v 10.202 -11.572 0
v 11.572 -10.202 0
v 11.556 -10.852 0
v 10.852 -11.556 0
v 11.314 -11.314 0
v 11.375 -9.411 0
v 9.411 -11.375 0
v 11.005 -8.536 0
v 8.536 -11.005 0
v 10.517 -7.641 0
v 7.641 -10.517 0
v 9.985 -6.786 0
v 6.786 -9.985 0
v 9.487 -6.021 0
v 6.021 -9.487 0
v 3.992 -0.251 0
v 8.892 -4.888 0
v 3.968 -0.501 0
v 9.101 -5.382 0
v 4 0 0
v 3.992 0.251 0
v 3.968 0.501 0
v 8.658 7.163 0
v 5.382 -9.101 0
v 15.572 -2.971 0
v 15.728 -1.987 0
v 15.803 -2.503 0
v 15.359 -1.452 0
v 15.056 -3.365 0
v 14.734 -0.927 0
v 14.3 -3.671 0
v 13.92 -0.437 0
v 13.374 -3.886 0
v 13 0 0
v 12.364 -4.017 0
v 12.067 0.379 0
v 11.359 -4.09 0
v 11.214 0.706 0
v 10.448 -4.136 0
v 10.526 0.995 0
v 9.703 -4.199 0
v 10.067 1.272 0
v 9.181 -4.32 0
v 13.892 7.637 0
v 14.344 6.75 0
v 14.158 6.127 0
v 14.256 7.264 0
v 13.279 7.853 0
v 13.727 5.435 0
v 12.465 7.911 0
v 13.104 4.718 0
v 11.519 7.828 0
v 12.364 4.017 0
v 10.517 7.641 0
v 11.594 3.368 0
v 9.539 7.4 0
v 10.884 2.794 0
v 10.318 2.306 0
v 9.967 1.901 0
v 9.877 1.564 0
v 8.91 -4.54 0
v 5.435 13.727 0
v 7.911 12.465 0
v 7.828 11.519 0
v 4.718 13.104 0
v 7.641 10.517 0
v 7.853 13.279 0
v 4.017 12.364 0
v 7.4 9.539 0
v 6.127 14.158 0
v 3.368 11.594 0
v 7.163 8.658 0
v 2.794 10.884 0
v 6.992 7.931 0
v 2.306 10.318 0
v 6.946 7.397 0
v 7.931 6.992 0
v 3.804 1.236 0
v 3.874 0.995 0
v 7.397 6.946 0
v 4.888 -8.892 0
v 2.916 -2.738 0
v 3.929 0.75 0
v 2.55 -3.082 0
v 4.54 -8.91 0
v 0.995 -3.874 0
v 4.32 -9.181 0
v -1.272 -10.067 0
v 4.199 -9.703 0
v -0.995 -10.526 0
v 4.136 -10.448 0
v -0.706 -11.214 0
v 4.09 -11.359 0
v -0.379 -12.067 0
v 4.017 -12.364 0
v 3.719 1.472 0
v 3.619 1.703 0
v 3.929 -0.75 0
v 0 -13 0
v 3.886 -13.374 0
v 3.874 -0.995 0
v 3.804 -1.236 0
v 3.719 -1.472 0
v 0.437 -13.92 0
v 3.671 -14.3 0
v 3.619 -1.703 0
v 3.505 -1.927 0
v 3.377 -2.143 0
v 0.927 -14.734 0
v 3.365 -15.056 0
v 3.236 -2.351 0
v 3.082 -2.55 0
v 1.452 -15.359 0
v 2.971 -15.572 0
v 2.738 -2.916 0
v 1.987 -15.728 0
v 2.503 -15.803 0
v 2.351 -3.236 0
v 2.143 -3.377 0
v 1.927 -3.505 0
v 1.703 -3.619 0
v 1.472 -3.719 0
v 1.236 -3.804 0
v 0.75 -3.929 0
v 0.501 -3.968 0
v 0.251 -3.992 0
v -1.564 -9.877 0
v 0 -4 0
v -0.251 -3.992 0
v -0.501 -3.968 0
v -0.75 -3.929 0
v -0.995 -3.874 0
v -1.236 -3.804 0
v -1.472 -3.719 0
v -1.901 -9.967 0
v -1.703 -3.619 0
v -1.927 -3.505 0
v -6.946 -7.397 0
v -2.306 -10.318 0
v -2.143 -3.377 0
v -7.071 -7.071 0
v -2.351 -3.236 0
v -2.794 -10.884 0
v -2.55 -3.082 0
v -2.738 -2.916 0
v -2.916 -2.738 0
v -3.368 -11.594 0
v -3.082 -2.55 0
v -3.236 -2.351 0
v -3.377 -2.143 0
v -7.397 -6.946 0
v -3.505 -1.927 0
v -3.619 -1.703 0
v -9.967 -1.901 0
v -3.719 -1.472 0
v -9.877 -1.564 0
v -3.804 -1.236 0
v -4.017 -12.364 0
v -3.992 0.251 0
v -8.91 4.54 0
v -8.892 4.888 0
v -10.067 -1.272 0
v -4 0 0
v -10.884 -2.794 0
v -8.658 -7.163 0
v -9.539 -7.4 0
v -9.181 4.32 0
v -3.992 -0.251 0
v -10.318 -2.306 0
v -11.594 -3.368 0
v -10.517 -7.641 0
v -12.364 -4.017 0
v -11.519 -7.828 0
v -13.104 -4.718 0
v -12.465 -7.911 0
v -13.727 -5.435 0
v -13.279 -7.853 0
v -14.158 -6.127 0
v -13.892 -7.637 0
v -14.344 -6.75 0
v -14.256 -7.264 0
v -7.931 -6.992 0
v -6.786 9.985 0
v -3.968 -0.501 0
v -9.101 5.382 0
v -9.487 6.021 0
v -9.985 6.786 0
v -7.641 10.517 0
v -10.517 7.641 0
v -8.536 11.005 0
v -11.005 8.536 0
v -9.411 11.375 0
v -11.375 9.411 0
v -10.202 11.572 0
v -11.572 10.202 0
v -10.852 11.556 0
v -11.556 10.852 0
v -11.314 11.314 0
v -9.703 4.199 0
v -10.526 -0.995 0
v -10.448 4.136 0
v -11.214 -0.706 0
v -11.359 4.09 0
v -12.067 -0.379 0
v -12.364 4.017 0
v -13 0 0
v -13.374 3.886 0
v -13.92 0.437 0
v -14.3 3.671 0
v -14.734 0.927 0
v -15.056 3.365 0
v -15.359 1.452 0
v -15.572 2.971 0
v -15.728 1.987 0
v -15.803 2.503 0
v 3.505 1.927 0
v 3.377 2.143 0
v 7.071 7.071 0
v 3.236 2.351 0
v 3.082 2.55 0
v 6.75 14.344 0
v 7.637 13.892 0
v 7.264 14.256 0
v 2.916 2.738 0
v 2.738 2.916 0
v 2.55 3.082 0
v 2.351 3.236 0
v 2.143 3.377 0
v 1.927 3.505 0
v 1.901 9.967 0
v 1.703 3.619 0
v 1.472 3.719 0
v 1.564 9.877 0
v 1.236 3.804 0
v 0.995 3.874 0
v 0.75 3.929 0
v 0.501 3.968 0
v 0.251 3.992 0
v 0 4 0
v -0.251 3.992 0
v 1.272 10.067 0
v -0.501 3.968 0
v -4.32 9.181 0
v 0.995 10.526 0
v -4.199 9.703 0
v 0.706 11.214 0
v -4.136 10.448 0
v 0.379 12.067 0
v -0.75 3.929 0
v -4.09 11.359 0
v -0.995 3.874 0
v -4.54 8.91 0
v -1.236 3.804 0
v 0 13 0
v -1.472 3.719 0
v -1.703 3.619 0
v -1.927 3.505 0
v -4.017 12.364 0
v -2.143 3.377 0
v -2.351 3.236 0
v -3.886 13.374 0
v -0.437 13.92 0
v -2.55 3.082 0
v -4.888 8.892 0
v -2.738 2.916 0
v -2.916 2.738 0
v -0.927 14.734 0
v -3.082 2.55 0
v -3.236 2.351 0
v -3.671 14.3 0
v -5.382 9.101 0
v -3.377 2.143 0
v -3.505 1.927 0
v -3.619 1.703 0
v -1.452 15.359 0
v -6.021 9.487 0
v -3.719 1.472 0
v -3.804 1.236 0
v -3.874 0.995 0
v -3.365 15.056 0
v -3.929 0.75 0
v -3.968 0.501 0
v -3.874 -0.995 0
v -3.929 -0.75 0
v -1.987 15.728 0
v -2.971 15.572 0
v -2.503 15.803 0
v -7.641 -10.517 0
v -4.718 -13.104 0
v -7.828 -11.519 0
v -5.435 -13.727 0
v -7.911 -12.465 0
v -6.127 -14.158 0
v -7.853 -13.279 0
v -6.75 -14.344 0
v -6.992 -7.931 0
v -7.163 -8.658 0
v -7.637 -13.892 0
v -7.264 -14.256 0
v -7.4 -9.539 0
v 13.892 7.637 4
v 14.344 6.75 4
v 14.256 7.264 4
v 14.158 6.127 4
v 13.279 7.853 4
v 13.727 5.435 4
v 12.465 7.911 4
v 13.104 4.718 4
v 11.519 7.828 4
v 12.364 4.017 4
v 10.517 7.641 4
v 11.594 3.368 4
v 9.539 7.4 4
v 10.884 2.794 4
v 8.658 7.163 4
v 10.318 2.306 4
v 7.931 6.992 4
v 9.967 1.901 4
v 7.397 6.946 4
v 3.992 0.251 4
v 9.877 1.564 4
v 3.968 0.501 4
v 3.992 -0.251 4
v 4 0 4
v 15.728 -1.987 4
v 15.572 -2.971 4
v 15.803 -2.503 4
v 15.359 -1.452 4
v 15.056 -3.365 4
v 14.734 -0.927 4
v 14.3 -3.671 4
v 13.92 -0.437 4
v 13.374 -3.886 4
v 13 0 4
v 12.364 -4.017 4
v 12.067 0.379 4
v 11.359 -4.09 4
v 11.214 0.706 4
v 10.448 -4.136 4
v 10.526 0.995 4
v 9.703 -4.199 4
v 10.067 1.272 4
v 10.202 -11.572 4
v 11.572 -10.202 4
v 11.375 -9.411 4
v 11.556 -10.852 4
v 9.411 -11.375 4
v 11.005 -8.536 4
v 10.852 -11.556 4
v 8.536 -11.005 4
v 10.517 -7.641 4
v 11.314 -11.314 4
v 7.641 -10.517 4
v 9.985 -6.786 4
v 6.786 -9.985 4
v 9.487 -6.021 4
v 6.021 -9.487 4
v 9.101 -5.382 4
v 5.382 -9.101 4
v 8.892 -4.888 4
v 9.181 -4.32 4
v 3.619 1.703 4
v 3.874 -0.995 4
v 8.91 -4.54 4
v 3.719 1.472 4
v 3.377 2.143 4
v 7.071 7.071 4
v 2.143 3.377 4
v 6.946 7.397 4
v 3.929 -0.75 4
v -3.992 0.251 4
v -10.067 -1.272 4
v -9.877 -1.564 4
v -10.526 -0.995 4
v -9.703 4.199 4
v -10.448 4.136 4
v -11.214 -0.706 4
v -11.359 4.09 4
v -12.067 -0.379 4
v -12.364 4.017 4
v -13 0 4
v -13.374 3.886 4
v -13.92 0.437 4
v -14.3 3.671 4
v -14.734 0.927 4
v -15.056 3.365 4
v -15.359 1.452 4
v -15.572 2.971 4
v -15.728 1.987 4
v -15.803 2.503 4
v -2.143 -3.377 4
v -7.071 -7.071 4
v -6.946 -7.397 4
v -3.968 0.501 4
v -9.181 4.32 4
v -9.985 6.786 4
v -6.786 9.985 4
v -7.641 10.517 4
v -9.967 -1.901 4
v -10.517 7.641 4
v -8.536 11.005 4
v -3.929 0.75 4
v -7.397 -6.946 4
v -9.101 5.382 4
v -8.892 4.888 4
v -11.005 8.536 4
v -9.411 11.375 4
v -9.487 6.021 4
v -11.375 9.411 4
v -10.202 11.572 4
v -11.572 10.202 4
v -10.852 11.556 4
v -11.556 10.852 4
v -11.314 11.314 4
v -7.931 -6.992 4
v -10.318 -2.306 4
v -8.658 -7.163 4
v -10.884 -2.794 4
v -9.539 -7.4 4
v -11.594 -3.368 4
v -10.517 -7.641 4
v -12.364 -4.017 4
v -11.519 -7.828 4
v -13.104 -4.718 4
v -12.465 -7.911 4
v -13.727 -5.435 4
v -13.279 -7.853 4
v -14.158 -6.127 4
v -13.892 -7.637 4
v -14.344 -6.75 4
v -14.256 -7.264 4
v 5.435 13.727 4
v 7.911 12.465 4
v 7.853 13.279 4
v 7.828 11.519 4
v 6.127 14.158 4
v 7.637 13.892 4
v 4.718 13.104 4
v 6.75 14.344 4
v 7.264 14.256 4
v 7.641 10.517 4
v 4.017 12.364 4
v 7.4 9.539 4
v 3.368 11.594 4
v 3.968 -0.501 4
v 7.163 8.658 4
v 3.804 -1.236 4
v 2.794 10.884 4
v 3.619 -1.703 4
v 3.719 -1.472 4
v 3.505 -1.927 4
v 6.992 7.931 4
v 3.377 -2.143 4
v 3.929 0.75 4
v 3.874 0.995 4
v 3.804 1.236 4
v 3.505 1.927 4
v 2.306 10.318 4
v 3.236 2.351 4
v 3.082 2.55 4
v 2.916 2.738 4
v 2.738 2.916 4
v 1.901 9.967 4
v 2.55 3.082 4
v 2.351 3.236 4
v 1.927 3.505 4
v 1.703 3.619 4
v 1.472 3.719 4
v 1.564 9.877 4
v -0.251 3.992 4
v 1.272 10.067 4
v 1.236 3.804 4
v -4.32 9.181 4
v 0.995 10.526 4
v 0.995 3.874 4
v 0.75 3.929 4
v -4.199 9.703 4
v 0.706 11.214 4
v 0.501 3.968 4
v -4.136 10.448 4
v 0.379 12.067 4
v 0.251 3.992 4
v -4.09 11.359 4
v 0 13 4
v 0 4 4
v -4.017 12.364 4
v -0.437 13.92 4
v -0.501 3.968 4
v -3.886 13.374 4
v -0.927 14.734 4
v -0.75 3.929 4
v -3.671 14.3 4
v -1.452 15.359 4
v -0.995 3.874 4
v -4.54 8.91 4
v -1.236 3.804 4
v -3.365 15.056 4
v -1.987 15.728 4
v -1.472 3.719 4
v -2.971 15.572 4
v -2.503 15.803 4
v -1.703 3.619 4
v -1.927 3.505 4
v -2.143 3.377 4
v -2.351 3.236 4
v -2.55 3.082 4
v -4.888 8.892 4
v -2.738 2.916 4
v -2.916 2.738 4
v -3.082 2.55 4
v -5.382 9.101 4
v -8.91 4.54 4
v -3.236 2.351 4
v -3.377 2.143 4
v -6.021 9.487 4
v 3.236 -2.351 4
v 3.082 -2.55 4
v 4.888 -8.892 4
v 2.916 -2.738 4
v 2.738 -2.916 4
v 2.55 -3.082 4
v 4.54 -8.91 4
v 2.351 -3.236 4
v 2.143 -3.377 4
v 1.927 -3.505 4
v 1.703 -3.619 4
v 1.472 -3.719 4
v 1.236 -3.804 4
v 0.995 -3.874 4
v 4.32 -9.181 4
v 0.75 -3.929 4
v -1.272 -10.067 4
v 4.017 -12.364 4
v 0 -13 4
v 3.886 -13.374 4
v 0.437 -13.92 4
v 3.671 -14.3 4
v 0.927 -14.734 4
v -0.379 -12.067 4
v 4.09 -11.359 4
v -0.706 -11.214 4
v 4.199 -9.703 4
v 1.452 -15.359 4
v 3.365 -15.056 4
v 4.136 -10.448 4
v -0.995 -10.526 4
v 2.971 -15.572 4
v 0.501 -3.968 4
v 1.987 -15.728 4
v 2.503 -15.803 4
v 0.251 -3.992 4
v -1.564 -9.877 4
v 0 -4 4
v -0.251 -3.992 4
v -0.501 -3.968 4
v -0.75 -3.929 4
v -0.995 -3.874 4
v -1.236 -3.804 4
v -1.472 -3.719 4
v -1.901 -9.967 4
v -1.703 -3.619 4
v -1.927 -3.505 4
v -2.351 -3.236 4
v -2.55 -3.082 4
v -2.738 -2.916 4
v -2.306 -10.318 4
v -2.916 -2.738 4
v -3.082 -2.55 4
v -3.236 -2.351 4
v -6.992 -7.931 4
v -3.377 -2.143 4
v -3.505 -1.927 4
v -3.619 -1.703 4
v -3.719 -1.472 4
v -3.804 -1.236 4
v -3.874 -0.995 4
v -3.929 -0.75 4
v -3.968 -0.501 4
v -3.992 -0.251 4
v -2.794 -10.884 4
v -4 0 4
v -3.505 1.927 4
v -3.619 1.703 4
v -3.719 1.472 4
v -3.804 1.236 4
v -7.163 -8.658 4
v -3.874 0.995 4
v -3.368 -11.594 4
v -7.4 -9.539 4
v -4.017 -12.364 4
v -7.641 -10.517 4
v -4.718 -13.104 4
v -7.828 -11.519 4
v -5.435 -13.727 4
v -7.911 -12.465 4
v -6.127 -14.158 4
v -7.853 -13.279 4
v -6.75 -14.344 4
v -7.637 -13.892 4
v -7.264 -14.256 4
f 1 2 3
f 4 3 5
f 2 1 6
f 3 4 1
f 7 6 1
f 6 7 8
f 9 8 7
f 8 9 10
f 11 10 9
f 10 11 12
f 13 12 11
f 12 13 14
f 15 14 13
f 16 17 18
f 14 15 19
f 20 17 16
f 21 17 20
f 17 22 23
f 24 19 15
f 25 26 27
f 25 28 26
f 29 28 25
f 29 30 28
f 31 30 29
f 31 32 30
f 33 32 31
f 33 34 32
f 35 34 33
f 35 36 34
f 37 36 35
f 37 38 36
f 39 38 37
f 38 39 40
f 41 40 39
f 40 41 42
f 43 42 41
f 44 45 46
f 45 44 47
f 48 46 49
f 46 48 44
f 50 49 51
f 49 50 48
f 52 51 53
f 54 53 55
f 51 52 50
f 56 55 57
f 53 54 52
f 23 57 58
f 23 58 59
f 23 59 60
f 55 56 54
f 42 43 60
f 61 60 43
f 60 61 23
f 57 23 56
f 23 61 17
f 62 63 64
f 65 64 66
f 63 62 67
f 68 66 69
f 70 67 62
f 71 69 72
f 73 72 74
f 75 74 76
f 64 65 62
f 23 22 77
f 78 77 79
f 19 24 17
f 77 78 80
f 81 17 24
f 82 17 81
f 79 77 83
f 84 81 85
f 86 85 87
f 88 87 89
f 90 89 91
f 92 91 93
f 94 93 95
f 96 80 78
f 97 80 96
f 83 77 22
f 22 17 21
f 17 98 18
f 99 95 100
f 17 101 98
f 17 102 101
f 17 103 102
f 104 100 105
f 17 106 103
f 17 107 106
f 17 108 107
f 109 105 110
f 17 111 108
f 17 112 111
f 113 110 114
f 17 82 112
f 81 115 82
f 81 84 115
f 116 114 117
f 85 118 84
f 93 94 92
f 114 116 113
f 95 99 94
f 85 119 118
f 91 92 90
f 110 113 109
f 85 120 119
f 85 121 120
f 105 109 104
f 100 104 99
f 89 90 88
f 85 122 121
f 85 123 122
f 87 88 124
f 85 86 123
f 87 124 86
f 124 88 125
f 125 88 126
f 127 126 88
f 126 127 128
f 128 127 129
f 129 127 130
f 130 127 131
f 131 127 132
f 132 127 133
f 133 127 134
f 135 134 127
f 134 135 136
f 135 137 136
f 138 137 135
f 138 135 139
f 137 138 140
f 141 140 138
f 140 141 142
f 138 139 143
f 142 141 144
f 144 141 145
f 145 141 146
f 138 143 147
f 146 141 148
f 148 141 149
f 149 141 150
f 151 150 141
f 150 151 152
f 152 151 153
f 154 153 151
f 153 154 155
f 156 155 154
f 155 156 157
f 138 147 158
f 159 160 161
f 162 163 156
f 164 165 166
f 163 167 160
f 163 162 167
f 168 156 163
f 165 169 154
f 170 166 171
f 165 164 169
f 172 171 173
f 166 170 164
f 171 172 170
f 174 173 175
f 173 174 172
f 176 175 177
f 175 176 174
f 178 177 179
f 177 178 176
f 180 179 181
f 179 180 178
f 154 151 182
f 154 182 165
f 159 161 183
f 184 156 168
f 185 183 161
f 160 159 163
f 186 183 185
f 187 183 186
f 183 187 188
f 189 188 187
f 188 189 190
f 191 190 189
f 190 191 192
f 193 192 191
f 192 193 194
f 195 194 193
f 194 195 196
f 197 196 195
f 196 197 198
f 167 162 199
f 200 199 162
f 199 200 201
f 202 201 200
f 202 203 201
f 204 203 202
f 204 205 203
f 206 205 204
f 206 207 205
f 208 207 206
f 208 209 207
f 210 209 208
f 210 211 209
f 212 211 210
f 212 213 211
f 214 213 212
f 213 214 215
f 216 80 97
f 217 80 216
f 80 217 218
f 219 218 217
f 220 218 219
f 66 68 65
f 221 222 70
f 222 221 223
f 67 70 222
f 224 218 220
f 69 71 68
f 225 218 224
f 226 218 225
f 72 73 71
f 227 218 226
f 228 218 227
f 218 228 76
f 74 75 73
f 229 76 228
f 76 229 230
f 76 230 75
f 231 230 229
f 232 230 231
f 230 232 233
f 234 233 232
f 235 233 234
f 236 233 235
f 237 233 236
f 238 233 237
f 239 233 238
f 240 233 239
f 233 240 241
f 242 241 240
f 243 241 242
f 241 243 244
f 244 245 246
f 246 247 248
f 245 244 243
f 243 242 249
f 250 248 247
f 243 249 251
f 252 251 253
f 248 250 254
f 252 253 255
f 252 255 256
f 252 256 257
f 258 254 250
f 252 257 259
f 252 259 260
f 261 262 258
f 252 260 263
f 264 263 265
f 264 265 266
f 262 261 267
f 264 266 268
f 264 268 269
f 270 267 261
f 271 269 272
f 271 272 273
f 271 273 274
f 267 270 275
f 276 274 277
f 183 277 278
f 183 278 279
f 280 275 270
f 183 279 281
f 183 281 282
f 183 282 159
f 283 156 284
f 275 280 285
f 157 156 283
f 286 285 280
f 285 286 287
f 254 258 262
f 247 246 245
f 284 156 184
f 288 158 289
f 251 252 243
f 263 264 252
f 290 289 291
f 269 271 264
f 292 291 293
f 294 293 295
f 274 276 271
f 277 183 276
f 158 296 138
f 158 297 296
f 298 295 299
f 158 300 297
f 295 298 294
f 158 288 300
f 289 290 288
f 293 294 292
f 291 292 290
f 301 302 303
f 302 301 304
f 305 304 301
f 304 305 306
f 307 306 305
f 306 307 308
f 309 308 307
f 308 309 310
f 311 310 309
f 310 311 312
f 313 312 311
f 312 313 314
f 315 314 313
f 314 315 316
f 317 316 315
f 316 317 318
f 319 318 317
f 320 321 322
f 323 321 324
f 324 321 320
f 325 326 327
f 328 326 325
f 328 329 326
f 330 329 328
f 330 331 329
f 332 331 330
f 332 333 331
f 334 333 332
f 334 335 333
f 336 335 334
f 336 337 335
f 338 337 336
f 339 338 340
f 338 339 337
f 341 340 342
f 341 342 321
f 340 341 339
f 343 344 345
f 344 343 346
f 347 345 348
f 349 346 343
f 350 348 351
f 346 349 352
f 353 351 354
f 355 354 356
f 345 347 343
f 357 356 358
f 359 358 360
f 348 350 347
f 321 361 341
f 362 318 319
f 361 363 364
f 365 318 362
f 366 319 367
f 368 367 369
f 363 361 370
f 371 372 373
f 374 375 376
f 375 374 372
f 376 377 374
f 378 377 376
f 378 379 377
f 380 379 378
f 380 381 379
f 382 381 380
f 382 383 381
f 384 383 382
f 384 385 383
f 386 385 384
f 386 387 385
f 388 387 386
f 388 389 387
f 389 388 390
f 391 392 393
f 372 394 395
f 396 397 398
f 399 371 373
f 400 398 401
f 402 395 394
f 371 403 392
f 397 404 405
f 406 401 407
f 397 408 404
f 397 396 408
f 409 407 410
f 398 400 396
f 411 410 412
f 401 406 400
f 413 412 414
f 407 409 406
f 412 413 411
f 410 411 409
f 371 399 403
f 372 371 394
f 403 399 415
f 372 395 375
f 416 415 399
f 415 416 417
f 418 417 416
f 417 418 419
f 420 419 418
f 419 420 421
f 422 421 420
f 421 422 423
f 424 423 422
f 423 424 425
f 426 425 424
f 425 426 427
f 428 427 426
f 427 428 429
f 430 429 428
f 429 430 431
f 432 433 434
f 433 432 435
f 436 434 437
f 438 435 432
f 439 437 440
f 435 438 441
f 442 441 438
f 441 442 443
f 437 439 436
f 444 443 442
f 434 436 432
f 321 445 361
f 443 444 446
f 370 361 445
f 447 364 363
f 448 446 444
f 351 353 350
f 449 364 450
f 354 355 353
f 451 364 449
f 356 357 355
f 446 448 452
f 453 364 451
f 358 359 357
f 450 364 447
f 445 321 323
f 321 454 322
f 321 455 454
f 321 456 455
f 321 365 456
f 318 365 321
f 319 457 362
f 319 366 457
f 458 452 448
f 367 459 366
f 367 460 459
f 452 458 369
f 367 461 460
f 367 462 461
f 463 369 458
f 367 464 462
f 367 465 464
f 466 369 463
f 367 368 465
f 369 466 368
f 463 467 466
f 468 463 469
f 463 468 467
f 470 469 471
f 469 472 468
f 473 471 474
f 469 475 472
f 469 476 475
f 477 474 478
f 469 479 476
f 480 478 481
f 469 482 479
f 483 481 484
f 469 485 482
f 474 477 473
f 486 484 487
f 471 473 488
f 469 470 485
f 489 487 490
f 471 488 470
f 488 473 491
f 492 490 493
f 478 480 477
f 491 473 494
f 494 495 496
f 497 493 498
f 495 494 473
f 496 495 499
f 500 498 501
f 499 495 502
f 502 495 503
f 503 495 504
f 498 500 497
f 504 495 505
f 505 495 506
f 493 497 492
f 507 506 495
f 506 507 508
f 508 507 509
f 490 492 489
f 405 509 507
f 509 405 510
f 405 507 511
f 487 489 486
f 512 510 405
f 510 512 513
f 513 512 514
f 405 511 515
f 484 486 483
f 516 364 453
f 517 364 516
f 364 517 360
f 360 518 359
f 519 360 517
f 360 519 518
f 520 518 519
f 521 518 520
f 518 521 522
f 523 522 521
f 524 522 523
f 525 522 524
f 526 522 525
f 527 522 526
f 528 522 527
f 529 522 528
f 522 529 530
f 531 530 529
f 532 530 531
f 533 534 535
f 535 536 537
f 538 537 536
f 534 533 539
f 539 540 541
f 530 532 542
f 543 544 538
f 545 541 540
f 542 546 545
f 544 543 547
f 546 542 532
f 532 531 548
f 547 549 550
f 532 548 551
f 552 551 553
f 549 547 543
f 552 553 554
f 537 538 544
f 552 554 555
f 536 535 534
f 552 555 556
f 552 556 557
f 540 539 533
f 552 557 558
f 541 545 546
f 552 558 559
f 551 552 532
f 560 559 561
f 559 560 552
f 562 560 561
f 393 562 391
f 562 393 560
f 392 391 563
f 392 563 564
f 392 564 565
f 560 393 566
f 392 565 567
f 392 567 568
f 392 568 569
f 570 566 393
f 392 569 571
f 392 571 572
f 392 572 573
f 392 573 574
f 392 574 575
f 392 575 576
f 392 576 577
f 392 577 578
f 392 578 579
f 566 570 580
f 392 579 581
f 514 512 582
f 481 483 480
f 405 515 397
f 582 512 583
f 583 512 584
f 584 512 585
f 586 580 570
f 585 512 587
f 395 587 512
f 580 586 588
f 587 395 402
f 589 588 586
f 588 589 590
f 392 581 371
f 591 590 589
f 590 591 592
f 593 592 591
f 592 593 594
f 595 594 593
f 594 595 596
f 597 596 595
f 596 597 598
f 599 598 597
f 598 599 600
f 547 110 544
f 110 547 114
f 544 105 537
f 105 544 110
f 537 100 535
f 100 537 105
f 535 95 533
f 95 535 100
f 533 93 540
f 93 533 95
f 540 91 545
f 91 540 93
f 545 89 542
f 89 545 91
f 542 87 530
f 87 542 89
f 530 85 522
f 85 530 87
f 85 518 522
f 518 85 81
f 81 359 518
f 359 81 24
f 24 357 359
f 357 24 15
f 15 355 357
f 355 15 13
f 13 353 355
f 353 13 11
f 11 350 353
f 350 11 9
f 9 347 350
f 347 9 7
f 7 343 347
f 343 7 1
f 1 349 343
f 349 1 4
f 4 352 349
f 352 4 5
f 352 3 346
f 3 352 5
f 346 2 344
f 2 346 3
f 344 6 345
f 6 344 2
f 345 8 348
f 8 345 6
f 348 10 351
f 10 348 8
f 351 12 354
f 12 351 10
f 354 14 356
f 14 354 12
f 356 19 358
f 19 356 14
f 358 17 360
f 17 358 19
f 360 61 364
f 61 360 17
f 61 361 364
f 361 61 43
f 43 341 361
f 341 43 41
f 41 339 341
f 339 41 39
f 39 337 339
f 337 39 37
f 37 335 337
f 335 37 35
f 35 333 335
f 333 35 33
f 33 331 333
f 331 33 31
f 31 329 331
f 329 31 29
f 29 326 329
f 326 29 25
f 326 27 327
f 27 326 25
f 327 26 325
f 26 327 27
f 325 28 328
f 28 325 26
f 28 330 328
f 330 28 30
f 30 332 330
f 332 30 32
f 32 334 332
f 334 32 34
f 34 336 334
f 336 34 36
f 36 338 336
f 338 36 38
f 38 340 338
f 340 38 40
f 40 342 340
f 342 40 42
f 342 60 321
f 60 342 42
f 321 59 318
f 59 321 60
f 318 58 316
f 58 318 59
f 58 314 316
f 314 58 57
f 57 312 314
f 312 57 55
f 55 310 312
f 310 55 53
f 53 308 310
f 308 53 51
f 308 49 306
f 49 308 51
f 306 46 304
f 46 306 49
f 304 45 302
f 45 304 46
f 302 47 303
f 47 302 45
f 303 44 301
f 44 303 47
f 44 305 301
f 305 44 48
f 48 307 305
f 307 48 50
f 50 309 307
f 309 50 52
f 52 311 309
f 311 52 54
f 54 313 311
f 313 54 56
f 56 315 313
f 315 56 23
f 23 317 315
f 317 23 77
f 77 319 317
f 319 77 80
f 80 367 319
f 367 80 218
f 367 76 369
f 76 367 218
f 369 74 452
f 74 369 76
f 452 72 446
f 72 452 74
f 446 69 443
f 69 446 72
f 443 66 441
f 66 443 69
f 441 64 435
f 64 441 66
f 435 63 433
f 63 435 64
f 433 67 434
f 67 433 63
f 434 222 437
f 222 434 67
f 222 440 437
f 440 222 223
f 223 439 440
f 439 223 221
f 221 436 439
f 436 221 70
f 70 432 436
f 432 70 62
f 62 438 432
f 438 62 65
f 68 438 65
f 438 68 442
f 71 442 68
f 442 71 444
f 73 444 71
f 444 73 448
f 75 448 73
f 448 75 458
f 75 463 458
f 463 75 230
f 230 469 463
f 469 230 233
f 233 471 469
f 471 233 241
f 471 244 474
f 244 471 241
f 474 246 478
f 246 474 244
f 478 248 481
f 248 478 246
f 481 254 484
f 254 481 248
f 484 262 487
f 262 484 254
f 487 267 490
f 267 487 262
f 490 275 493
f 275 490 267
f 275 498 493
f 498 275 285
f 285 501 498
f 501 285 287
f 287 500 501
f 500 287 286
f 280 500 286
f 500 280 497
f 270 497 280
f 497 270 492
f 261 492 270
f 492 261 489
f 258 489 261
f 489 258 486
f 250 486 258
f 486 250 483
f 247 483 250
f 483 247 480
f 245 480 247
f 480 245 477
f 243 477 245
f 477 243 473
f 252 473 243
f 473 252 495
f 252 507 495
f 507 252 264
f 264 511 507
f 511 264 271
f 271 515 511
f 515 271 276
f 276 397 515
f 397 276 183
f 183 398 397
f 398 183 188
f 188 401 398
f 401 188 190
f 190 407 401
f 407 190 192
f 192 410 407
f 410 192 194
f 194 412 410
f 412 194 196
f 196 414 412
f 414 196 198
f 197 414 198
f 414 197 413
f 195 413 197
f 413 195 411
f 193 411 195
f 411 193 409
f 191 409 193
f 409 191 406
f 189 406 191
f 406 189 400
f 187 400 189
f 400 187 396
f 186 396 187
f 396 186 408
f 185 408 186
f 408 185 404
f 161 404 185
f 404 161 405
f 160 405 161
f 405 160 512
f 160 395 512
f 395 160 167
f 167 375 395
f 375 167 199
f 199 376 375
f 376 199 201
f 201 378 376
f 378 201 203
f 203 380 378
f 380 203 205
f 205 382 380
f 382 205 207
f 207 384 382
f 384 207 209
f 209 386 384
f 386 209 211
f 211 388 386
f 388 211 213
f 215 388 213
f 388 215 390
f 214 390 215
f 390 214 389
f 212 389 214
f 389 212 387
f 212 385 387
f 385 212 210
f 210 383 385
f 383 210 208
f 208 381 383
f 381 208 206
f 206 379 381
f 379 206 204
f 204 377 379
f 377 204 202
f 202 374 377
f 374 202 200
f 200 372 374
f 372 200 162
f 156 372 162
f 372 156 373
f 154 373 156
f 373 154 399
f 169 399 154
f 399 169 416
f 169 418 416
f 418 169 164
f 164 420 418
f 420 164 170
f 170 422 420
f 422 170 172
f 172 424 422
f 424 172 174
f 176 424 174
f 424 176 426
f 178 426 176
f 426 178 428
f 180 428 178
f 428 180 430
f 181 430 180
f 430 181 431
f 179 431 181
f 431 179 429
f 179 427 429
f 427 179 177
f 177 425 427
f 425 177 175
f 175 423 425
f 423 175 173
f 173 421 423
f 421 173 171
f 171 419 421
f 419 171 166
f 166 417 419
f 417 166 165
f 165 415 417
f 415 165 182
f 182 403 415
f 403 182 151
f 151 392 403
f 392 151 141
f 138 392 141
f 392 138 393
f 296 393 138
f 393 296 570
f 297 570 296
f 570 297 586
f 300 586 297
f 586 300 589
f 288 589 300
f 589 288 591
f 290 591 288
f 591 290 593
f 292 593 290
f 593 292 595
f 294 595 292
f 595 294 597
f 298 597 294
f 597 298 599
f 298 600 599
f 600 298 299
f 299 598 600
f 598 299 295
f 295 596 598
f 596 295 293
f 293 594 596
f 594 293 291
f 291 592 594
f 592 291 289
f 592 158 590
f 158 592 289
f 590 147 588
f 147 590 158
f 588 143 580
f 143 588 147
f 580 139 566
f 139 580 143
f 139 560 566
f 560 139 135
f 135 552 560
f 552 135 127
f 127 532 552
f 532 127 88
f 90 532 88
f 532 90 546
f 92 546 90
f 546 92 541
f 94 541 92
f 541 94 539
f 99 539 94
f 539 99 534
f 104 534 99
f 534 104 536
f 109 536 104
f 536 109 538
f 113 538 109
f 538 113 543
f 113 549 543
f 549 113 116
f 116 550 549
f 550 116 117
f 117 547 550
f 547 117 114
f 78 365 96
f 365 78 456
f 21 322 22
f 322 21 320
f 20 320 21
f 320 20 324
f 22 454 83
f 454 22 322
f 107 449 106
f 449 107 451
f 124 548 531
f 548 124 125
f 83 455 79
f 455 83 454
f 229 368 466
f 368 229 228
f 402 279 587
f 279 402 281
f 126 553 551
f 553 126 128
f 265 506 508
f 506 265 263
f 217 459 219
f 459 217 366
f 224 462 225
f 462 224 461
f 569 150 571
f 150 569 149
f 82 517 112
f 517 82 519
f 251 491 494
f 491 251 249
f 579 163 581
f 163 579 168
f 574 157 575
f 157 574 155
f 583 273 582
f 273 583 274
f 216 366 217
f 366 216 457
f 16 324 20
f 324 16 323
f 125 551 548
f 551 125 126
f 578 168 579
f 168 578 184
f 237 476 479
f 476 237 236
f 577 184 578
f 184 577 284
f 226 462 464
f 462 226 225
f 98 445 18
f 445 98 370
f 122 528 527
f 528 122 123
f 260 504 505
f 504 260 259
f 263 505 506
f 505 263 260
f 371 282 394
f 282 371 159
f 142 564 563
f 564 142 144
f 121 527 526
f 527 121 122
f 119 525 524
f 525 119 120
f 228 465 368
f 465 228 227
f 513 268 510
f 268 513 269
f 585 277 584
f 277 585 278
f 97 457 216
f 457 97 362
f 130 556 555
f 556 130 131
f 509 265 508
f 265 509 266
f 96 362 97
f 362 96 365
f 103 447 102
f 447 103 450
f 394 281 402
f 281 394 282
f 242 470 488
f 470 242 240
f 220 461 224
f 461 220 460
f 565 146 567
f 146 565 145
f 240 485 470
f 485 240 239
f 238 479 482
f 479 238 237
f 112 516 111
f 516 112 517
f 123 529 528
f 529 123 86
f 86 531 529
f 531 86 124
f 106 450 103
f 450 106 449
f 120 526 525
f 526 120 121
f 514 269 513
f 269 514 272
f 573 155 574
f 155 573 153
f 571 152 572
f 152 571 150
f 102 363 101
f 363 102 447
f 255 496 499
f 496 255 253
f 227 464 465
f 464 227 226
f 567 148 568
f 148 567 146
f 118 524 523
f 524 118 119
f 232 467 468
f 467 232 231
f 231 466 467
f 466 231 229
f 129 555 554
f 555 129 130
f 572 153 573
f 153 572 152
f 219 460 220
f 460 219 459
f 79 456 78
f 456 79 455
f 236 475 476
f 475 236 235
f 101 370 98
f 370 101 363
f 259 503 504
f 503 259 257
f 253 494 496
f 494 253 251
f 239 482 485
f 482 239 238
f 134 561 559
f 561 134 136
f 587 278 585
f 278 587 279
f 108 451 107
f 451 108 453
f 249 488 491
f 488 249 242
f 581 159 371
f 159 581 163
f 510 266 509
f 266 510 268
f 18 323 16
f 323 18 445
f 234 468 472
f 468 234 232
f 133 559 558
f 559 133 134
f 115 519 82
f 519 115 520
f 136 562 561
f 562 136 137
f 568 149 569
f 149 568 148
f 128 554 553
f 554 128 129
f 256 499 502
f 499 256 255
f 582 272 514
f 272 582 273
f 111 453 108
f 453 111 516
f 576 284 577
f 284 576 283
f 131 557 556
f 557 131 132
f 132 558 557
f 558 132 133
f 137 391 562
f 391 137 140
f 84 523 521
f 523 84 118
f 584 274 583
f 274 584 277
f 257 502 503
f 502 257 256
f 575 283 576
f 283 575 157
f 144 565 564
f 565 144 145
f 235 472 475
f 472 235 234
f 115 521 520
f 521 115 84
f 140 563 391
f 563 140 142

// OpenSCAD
// Parâmetros principais

num_lobes = 10;        // número de "dentes"/lóbulos

//10
outer_radius = 10;     // raio externo
//15
inner_radius = 13;     // raio base (define profundidade dos lóbulos)

thickness = 4;         // altura da peça

hole_radius = 4;       // raio do furo central

resolution = 200;      // suavidade

// Função que cria o perfil "ondulado"

function radial(r_base, r_amp, lobes, angle) =

    r_base + r_amp * sin(lobes * angle);

// Gera pontos do contorno

points = [

    for (i = [0 : resolution])

        let (

            angle = i * 360 / resolution,

            r = radial(inner_radius, outer_radius - inner_radius, num_lobes, angle)

        )

        [r * cos(angle), r * sin(angle)]

];

// Modelo 3D

difference() {

    linear_extrude(height = thickness)

        polygon(points);

    // Furo central

    translate([0,0,-1])

        cylinder(h = thickness + 2, r = hole_radius, $fn=100);

}
 
